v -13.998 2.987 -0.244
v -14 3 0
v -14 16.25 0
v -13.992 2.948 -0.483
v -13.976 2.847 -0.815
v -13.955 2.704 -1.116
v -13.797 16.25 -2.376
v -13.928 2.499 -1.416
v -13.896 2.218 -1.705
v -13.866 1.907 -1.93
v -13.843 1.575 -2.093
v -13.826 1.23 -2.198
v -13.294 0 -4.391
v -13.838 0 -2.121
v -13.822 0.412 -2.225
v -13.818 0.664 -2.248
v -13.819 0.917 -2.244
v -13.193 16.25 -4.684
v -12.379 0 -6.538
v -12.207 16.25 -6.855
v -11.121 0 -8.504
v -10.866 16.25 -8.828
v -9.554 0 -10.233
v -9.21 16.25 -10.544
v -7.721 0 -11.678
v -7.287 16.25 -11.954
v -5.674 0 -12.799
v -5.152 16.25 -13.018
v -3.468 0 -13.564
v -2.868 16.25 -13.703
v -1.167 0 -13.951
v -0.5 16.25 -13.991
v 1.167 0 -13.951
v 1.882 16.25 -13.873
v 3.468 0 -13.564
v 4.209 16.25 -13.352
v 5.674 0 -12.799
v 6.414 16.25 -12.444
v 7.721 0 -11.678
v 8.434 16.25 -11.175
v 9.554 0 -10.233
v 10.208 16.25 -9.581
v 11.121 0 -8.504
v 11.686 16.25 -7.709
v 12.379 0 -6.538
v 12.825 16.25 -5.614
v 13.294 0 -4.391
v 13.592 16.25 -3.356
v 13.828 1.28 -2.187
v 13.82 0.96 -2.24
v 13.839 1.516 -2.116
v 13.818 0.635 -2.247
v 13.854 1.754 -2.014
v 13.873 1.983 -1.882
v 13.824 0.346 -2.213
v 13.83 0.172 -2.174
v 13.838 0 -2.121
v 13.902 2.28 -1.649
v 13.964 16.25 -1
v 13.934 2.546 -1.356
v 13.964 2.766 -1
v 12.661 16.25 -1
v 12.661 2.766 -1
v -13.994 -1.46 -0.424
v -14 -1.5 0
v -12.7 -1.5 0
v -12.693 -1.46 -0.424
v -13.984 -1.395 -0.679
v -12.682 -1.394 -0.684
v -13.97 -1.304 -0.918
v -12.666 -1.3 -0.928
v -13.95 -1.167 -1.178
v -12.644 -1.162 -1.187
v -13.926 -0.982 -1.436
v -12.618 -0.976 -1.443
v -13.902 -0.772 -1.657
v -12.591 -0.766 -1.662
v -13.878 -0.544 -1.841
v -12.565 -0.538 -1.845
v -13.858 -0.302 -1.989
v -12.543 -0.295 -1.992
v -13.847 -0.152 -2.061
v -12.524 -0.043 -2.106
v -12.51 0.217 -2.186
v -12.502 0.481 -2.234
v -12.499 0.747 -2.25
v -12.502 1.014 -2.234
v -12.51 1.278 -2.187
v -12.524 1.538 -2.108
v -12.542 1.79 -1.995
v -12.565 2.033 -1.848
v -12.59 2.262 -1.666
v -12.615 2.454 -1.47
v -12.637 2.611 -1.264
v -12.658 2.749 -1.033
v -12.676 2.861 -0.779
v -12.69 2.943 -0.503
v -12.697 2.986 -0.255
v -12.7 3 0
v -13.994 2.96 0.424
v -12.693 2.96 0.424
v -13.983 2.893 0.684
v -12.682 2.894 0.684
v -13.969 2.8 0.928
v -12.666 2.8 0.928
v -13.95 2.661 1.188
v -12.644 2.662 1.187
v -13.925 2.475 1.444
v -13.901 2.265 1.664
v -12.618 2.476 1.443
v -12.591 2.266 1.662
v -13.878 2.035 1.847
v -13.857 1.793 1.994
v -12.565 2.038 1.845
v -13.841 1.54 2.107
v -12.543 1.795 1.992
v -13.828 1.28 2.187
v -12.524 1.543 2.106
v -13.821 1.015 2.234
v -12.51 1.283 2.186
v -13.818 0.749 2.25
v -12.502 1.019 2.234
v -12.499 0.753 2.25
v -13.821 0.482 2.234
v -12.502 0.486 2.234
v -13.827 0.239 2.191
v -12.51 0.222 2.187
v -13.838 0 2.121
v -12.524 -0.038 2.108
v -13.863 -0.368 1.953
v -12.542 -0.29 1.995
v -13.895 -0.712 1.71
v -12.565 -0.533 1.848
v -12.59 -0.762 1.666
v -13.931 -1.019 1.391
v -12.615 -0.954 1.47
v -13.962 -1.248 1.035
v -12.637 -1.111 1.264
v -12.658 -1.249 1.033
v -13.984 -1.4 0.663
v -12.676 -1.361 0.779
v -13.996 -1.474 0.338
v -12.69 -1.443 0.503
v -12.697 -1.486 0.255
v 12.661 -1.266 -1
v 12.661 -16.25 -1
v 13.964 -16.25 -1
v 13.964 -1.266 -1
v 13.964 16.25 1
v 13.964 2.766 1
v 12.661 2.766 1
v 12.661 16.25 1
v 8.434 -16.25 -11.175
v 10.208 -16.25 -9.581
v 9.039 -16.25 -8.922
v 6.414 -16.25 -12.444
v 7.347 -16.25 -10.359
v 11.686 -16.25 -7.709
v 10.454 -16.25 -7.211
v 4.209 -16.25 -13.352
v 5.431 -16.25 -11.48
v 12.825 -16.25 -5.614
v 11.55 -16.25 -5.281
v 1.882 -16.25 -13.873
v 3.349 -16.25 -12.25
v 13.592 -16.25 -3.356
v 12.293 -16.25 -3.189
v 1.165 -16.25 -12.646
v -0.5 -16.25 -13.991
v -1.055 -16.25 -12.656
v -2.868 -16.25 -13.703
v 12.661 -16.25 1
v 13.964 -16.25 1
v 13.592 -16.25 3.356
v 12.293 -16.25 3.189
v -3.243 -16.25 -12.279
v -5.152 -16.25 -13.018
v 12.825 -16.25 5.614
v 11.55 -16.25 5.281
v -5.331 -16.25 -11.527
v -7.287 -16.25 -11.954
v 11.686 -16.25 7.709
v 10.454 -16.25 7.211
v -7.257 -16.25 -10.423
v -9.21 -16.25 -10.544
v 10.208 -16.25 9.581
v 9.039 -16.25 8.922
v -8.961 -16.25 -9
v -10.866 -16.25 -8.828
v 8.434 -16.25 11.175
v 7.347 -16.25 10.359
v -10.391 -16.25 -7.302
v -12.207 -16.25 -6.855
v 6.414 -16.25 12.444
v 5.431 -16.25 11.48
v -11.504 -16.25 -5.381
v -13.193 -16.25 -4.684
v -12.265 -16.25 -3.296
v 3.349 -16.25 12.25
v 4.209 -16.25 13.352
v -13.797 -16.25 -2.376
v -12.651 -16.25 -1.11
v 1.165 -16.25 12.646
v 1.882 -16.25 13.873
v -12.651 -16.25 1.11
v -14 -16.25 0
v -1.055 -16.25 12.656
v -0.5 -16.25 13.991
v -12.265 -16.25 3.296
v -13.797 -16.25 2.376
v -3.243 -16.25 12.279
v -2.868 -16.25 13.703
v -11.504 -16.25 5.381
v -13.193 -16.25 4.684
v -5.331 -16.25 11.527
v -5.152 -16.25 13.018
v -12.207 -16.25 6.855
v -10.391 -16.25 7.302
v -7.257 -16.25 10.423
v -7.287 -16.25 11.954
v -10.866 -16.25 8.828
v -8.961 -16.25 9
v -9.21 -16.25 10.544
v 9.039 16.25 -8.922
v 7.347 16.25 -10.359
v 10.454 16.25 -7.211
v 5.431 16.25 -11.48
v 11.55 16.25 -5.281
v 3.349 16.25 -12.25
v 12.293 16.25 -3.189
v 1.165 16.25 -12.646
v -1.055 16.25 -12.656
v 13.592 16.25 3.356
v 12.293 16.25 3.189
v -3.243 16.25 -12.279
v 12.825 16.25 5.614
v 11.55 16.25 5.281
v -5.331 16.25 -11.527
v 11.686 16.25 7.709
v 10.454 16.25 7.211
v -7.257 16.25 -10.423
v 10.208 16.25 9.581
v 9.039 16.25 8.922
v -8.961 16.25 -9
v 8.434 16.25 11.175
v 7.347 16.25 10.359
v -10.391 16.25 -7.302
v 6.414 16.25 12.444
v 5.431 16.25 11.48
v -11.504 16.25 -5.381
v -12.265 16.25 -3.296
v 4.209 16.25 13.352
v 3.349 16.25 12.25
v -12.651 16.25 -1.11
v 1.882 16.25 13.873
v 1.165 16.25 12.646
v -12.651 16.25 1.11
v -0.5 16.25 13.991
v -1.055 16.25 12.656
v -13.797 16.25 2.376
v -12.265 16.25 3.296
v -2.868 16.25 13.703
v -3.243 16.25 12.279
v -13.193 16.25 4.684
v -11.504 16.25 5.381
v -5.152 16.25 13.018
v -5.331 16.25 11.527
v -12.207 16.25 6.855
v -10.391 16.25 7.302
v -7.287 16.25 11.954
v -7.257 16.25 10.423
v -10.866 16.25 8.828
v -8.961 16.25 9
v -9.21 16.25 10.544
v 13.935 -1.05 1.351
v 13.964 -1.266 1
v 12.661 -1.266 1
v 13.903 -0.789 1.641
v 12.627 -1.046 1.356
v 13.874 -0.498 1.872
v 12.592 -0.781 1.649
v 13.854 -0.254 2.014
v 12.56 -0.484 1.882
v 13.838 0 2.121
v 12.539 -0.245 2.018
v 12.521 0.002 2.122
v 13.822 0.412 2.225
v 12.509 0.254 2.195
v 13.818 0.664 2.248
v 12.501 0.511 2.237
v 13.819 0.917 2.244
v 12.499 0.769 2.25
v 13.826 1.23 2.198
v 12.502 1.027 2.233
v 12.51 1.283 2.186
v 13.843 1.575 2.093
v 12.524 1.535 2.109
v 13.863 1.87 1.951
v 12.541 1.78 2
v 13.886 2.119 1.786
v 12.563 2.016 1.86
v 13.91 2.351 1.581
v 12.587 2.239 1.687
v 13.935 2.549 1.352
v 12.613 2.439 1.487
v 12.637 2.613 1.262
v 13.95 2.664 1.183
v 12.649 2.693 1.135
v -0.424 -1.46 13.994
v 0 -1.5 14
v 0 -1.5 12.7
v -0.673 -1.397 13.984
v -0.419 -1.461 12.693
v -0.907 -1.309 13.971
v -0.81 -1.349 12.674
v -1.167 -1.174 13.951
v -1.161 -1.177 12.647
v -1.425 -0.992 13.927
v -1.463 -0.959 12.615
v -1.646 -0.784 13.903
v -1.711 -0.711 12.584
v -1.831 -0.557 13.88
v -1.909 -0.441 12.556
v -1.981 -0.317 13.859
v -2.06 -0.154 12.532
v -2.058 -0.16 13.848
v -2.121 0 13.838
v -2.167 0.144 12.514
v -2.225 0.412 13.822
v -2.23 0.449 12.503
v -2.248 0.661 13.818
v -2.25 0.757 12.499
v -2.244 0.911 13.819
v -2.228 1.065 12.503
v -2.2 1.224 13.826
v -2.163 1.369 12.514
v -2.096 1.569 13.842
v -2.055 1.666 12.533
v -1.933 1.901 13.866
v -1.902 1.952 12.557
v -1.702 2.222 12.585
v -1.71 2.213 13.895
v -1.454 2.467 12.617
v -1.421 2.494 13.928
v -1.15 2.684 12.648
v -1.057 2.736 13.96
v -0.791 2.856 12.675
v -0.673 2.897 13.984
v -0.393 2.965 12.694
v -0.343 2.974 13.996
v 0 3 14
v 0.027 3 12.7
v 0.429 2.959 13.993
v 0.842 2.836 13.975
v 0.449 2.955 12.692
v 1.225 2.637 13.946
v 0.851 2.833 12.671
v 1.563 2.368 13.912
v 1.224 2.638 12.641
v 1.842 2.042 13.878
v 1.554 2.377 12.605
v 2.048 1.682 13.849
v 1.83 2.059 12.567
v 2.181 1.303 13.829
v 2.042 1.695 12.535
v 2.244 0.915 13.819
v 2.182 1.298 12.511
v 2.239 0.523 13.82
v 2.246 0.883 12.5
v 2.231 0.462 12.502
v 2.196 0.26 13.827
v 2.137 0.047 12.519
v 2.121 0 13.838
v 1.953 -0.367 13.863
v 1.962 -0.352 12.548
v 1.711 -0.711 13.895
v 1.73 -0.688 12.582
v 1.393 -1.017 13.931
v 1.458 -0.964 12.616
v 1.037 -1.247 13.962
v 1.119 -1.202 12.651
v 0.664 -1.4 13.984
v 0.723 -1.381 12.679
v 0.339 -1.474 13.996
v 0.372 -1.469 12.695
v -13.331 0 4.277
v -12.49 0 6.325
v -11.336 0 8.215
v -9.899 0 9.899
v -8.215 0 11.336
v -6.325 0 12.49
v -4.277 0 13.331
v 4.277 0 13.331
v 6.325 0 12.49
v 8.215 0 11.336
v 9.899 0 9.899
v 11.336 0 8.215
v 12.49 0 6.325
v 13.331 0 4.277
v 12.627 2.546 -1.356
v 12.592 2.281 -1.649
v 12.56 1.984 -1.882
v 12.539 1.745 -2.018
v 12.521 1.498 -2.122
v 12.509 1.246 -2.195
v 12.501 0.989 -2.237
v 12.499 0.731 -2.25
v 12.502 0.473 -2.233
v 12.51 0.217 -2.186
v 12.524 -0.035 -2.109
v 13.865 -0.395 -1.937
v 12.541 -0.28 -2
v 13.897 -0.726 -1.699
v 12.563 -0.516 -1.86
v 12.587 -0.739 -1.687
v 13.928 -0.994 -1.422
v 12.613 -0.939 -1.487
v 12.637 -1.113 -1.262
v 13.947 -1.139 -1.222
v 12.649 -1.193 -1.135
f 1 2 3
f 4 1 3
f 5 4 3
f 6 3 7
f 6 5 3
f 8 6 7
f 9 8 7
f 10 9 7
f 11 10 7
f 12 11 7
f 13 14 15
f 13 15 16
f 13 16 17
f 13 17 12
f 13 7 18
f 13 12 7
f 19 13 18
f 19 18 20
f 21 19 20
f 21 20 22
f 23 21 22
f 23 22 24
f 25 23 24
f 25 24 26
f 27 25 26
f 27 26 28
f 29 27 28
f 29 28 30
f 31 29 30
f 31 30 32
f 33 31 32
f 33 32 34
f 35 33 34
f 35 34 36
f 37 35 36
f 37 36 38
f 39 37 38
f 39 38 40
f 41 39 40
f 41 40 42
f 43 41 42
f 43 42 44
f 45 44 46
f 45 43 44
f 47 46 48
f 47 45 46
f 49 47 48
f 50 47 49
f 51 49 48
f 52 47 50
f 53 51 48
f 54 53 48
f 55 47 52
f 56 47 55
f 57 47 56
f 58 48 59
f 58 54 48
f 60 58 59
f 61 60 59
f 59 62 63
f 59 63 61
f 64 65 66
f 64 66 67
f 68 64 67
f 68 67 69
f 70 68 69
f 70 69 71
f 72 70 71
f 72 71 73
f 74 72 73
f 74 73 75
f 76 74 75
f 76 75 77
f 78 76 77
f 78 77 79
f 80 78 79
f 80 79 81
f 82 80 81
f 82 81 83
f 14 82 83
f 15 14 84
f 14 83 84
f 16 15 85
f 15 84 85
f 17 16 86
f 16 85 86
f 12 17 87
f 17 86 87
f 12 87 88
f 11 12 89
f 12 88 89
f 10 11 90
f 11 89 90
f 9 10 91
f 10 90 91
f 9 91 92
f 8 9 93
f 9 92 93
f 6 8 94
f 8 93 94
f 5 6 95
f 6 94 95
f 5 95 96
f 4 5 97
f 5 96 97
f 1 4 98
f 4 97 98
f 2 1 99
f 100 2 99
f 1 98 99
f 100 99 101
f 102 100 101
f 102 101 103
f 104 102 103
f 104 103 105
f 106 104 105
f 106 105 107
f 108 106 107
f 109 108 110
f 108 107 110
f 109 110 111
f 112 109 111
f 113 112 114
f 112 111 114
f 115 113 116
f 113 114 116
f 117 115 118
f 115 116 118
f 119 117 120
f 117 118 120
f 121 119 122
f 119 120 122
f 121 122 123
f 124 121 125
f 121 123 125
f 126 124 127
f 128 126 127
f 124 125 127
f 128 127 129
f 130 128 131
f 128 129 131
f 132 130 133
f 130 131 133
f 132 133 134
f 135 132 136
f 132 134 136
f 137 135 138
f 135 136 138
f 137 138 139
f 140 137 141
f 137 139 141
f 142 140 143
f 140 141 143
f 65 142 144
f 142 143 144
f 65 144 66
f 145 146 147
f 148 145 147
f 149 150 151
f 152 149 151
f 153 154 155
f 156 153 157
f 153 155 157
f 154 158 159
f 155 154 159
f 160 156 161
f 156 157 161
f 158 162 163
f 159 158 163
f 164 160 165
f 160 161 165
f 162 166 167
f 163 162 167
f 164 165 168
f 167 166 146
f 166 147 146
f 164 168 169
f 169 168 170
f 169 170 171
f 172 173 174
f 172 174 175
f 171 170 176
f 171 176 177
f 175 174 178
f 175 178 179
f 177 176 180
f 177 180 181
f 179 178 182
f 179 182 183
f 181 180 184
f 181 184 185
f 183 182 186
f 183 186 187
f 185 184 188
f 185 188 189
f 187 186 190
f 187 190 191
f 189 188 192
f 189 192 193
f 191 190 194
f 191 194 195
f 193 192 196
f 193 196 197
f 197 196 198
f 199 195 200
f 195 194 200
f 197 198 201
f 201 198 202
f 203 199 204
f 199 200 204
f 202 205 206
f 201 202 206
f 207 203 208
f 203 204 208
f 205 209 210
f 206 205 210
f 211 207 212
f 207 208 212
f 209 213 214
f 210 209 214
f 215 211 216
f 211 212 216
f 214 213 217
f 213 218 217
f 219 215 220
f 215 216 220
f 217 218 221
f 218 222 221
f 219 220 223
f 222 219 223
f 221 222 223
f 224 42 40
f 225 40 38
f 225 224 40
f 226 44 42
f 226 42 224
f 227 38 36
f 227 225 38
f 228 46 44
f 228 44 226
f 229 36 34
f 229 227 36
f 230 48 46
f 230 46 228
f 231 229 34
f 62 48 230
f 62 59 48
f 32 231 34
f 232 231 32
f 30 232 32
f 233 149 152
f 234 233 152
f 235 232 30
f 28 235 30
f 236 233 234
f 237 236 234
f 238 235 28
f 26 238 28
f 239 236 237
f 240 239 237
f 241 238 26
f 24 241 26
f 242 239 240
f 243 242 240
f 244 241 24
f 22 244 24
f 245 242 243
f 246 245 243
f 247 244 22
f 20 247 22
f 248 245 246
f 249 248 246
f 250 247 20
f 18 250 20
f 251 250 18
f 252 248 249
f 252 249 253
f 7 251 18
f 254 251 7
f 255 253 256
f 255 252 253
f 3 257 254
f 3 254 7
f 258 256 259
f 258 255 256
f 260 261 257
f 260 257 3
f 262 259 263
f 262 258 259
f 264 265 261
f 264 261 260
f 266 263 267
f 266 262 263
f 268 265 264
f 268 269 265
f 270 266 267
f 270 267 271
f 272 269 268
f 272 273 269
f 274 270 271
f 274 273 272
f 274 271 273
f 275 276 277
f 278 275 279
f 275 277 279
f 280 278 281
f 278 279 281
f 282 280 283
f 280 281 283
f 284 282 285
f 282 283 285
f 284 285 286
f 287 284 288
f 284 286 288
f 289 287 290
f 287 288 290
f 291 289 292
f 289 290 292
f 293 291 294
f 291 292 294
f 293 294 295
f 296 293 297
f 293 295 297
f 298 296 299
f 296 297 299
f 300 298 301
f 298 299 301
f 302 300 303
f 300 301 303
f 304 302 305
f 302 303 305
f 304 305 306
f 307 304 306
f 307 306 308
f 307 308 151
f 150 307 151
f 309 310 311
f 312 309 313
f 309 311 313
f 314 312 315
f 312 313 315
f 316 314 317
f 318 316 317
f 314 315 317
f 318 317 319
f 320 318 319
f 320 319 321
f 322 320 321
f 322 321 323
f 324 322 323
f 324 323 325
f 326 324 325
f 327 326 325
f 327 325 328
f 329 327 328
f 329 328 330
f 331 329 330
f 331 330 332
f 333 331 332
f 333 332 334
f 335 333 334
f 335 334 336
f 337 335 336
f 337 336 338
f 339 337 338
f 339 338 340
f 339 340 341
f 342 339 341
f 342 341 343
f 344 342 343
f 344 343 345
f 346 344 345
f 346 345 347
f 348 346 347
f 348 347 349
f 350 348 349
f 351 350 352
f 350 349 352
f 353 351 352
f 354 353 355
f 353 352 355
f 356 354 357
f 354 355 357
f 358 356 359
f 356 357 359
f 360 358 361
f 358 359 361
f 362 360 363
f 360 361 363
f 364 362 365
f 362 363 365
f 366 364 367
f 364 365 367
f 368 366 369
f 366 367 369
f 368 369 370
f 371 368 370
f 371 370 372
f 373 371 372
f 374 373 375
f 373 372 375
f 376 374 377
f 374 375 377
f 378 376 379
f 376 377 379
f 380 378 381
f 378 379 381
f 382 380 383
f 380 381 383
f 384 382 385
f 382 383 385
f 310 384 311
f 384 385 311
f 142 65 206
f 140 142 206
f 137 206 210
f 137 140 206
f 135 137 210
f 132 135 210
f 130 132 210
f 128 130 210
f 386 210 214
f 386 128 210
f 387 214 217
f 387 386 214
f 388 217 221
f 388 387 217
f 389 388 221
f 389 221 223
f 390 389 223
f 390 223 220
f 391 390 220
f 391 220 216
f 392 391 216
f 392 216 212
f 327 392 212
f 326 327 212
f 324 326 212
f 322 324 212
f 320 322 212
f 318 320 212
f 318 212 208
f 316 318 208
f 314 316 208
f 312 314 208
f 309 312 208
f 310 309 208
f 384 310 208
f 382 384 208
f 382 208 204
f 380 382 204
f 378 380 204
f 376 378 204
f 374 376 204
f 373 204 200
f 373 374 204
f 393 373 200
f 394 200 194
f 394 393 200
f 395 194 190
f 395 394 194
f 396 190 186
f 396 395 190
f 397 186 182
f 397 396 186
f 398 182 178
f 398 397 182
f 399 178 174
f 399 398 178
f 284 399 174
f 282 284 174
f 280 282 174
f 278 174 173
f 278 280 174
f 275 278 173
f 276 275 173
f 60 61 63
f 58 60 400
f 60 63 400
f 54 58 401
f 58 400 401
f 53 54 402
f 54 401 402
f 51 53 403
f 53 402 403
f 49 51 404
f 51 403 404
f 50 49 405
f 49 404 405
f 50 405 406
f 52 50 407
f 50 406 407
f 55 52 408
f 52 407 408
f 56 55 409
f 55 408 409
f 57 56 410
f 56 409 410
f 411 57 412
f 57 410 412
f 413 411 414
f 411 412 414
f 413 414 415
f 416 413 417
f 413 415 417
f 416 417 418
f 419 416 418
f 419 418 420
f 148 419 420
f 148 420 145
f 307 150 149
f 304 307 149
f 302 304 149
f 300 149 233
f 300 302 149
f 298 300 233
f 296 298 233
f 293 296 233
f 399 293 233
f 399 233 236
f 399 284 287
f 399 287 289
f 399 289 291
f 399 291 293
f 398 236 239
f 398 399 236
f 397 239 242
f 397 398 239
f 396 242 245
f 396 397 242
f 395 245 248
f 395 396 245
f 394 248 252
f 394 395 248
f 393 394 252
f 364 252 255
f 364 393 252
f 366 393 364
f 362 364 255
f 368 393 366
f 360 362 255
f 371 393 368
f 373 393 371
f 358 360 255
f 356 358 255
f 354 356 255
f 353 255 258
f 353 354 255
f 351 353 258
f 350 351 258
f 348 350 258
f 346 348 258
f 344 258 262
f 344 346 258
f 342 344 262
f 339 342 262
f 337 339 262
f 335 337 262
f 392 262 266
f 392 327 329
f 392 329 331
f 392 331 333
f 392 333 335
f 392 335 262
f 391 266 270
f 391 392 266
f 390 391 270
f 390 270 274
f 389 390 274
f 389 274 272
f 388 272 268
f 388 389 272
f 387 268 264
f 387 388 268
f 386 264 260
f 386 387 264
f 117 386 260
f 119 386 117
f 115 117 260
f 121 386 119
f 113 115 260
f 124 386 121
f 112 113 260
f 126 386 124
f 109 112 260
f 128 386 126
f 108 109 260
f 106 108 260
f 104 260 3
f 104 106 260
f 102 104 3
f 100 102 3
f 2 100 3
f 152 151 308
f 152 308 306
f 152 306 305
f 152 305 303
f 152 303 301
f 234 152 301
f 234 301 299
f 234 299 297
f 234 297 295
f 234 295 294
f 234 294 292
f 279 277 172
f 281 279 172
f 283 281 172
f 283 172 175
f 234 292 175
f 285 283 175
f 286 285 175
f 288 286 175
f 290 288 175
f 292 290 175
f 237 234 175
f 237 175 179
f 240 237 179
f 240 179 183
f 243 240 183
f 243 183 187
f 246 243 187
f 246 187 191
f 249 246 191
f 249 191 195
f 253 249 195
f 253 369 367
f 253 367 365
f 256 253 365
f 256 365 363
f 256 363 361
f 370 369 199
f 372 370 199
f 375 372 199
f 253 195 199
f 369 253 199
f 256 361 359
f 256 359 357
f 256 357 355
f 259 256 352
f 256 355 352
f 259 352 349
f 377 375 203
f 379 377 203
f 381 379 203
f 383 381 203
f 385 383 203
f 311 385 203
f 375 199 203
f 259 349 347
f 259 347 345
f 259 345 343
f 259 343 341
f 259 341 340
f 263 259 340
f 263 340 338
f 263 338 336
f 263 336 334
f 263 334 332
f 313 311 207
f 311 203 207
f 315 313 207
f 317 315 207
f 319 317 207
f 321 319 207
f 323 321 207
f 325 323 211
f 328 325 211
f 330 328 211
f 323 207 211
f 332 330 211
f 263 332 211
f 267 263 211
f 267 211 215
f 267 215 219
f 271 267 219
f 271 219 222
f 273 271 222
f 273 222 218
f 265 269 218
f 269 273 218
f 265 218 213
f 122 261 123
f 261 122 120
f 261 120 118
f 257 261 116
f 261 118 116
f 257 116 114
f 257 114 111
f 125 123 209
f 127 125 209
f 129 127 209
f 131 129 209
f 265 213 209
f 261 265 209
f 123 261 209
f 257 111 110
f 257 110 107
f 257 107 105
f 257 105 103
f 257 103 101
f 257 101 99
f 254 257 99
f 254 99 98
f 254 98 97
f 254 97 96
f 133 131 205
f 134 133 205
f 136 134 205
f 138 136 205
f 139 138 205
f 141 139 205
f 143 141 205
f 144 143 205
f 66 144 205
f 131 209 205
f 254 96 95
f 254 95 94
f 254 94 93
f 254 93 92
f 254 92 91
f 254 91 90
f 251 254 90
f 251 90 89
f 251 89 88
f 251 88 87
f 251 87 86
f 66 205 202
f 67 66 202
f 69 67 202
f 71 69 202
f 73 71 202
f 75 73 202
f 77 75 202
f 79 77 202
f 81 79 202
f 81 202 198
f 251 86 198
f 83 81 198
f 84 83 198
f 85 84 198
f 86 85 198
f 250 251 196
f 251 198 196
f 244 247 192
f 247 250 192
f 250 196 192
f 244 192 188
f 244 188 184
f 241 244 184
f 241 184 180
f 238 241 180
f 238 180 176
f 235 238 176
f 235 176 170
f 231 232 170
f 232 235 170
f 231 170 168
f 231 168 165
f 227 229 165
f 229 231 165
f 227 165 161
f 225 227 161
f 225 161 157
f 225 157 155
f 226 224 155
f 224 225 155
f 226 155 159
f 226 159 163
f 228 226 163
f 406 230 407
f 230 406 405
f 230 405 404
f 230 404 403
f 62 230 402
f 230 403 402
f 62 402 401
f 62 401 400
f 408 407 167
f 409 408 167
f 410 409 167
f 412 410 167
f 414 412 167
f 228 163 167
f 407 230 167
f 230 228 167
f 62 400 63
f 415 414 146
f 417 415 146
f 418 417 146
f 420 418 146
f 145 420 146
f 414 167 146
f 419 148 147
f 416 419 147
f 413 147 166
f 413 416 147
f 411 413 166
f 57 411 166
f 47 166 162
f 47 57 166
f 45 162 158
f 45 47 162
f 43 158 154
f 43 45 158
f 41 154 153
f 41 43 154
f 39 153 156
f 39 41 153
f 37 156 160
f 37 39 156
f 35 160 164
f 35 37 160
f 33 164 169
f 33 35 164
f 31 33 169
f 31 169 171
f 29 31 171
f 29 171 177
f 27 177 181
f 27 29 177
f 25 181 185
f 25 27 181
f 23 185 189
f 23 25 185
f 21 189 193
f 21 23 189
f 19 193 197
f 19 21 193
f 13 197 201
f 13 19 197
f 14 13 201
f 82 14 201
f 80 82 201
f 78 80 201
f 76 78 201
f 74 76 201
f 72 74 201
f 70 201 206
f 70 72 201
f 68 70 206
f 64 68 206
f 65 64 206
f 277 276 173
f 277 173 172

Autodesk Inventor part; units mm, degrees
ref_plane "YZ Plane" through (0, 0, 0) normal (1, 0, 0) x (0, 1, 0)
ref_plane "XZ Plane" through (0, 0, 0) normal (0, 1, 0) x (-1, 0, 0)
sketch "Sketch2" plane through (0, 0, 0) normal (0, 1, 0) x (-1, 0, 0)
  circle A0 centre (0, 0) radius 14
  circle A1 centre (0, 0) radius 12.7
  line L0 (0, -19.6) -> (0, 19.6) projected
  line L1 (-12.6606, -1) -> (-13.9642, -1)
  line L2 (-13.9642, 1) -> (-12.6606, 1)
  line L3 (19.6, 0) -> (-19.6, 0) projected
  dimension "d3" = 25.4
  dimension "d4" = 28
  dimension "d19" = 2
  dimension "d20" = 1.3
extrude "Extrusion1" add sketch "Sketch2" along normal mid plane 32.5 contours L3 A1 L0 A0 | A0 L0 A1 L3 | L0 A1 L2 A0 | A0 L1 A1 L0
ref_plane "Work Plane1" through (0, 0, 14) normal (0, 0, 1) x (1, 0, 0)
sketch "Sketch3" plane through (0, 0, 14) normal (0, 0, 1) x (1, 0, 0)
  line L0 (-14, -16.25) -> (13.9642, -16.25) projected
  line L1 (0, -22.75) -> (0, 22.75) projected
  point P0 (0, 0)
  point P1 (0, 0.75)
  dimension "d8" = 17
hole "Hole1" at (0, 0.75, 14) direction (0, 0, -1) diameter 4.5 depth 10 clearance for "Socket Head Cap Screw DIN EN ISO 4762" size "M4" standard "DIN"
pattern_circular "Circular Pattern1" count 3 over 180 about axis through (0, -10, 0) along (0, 1, 0) of "Hole1" both ways yes
properties part number "Test_Blade_Holder"
